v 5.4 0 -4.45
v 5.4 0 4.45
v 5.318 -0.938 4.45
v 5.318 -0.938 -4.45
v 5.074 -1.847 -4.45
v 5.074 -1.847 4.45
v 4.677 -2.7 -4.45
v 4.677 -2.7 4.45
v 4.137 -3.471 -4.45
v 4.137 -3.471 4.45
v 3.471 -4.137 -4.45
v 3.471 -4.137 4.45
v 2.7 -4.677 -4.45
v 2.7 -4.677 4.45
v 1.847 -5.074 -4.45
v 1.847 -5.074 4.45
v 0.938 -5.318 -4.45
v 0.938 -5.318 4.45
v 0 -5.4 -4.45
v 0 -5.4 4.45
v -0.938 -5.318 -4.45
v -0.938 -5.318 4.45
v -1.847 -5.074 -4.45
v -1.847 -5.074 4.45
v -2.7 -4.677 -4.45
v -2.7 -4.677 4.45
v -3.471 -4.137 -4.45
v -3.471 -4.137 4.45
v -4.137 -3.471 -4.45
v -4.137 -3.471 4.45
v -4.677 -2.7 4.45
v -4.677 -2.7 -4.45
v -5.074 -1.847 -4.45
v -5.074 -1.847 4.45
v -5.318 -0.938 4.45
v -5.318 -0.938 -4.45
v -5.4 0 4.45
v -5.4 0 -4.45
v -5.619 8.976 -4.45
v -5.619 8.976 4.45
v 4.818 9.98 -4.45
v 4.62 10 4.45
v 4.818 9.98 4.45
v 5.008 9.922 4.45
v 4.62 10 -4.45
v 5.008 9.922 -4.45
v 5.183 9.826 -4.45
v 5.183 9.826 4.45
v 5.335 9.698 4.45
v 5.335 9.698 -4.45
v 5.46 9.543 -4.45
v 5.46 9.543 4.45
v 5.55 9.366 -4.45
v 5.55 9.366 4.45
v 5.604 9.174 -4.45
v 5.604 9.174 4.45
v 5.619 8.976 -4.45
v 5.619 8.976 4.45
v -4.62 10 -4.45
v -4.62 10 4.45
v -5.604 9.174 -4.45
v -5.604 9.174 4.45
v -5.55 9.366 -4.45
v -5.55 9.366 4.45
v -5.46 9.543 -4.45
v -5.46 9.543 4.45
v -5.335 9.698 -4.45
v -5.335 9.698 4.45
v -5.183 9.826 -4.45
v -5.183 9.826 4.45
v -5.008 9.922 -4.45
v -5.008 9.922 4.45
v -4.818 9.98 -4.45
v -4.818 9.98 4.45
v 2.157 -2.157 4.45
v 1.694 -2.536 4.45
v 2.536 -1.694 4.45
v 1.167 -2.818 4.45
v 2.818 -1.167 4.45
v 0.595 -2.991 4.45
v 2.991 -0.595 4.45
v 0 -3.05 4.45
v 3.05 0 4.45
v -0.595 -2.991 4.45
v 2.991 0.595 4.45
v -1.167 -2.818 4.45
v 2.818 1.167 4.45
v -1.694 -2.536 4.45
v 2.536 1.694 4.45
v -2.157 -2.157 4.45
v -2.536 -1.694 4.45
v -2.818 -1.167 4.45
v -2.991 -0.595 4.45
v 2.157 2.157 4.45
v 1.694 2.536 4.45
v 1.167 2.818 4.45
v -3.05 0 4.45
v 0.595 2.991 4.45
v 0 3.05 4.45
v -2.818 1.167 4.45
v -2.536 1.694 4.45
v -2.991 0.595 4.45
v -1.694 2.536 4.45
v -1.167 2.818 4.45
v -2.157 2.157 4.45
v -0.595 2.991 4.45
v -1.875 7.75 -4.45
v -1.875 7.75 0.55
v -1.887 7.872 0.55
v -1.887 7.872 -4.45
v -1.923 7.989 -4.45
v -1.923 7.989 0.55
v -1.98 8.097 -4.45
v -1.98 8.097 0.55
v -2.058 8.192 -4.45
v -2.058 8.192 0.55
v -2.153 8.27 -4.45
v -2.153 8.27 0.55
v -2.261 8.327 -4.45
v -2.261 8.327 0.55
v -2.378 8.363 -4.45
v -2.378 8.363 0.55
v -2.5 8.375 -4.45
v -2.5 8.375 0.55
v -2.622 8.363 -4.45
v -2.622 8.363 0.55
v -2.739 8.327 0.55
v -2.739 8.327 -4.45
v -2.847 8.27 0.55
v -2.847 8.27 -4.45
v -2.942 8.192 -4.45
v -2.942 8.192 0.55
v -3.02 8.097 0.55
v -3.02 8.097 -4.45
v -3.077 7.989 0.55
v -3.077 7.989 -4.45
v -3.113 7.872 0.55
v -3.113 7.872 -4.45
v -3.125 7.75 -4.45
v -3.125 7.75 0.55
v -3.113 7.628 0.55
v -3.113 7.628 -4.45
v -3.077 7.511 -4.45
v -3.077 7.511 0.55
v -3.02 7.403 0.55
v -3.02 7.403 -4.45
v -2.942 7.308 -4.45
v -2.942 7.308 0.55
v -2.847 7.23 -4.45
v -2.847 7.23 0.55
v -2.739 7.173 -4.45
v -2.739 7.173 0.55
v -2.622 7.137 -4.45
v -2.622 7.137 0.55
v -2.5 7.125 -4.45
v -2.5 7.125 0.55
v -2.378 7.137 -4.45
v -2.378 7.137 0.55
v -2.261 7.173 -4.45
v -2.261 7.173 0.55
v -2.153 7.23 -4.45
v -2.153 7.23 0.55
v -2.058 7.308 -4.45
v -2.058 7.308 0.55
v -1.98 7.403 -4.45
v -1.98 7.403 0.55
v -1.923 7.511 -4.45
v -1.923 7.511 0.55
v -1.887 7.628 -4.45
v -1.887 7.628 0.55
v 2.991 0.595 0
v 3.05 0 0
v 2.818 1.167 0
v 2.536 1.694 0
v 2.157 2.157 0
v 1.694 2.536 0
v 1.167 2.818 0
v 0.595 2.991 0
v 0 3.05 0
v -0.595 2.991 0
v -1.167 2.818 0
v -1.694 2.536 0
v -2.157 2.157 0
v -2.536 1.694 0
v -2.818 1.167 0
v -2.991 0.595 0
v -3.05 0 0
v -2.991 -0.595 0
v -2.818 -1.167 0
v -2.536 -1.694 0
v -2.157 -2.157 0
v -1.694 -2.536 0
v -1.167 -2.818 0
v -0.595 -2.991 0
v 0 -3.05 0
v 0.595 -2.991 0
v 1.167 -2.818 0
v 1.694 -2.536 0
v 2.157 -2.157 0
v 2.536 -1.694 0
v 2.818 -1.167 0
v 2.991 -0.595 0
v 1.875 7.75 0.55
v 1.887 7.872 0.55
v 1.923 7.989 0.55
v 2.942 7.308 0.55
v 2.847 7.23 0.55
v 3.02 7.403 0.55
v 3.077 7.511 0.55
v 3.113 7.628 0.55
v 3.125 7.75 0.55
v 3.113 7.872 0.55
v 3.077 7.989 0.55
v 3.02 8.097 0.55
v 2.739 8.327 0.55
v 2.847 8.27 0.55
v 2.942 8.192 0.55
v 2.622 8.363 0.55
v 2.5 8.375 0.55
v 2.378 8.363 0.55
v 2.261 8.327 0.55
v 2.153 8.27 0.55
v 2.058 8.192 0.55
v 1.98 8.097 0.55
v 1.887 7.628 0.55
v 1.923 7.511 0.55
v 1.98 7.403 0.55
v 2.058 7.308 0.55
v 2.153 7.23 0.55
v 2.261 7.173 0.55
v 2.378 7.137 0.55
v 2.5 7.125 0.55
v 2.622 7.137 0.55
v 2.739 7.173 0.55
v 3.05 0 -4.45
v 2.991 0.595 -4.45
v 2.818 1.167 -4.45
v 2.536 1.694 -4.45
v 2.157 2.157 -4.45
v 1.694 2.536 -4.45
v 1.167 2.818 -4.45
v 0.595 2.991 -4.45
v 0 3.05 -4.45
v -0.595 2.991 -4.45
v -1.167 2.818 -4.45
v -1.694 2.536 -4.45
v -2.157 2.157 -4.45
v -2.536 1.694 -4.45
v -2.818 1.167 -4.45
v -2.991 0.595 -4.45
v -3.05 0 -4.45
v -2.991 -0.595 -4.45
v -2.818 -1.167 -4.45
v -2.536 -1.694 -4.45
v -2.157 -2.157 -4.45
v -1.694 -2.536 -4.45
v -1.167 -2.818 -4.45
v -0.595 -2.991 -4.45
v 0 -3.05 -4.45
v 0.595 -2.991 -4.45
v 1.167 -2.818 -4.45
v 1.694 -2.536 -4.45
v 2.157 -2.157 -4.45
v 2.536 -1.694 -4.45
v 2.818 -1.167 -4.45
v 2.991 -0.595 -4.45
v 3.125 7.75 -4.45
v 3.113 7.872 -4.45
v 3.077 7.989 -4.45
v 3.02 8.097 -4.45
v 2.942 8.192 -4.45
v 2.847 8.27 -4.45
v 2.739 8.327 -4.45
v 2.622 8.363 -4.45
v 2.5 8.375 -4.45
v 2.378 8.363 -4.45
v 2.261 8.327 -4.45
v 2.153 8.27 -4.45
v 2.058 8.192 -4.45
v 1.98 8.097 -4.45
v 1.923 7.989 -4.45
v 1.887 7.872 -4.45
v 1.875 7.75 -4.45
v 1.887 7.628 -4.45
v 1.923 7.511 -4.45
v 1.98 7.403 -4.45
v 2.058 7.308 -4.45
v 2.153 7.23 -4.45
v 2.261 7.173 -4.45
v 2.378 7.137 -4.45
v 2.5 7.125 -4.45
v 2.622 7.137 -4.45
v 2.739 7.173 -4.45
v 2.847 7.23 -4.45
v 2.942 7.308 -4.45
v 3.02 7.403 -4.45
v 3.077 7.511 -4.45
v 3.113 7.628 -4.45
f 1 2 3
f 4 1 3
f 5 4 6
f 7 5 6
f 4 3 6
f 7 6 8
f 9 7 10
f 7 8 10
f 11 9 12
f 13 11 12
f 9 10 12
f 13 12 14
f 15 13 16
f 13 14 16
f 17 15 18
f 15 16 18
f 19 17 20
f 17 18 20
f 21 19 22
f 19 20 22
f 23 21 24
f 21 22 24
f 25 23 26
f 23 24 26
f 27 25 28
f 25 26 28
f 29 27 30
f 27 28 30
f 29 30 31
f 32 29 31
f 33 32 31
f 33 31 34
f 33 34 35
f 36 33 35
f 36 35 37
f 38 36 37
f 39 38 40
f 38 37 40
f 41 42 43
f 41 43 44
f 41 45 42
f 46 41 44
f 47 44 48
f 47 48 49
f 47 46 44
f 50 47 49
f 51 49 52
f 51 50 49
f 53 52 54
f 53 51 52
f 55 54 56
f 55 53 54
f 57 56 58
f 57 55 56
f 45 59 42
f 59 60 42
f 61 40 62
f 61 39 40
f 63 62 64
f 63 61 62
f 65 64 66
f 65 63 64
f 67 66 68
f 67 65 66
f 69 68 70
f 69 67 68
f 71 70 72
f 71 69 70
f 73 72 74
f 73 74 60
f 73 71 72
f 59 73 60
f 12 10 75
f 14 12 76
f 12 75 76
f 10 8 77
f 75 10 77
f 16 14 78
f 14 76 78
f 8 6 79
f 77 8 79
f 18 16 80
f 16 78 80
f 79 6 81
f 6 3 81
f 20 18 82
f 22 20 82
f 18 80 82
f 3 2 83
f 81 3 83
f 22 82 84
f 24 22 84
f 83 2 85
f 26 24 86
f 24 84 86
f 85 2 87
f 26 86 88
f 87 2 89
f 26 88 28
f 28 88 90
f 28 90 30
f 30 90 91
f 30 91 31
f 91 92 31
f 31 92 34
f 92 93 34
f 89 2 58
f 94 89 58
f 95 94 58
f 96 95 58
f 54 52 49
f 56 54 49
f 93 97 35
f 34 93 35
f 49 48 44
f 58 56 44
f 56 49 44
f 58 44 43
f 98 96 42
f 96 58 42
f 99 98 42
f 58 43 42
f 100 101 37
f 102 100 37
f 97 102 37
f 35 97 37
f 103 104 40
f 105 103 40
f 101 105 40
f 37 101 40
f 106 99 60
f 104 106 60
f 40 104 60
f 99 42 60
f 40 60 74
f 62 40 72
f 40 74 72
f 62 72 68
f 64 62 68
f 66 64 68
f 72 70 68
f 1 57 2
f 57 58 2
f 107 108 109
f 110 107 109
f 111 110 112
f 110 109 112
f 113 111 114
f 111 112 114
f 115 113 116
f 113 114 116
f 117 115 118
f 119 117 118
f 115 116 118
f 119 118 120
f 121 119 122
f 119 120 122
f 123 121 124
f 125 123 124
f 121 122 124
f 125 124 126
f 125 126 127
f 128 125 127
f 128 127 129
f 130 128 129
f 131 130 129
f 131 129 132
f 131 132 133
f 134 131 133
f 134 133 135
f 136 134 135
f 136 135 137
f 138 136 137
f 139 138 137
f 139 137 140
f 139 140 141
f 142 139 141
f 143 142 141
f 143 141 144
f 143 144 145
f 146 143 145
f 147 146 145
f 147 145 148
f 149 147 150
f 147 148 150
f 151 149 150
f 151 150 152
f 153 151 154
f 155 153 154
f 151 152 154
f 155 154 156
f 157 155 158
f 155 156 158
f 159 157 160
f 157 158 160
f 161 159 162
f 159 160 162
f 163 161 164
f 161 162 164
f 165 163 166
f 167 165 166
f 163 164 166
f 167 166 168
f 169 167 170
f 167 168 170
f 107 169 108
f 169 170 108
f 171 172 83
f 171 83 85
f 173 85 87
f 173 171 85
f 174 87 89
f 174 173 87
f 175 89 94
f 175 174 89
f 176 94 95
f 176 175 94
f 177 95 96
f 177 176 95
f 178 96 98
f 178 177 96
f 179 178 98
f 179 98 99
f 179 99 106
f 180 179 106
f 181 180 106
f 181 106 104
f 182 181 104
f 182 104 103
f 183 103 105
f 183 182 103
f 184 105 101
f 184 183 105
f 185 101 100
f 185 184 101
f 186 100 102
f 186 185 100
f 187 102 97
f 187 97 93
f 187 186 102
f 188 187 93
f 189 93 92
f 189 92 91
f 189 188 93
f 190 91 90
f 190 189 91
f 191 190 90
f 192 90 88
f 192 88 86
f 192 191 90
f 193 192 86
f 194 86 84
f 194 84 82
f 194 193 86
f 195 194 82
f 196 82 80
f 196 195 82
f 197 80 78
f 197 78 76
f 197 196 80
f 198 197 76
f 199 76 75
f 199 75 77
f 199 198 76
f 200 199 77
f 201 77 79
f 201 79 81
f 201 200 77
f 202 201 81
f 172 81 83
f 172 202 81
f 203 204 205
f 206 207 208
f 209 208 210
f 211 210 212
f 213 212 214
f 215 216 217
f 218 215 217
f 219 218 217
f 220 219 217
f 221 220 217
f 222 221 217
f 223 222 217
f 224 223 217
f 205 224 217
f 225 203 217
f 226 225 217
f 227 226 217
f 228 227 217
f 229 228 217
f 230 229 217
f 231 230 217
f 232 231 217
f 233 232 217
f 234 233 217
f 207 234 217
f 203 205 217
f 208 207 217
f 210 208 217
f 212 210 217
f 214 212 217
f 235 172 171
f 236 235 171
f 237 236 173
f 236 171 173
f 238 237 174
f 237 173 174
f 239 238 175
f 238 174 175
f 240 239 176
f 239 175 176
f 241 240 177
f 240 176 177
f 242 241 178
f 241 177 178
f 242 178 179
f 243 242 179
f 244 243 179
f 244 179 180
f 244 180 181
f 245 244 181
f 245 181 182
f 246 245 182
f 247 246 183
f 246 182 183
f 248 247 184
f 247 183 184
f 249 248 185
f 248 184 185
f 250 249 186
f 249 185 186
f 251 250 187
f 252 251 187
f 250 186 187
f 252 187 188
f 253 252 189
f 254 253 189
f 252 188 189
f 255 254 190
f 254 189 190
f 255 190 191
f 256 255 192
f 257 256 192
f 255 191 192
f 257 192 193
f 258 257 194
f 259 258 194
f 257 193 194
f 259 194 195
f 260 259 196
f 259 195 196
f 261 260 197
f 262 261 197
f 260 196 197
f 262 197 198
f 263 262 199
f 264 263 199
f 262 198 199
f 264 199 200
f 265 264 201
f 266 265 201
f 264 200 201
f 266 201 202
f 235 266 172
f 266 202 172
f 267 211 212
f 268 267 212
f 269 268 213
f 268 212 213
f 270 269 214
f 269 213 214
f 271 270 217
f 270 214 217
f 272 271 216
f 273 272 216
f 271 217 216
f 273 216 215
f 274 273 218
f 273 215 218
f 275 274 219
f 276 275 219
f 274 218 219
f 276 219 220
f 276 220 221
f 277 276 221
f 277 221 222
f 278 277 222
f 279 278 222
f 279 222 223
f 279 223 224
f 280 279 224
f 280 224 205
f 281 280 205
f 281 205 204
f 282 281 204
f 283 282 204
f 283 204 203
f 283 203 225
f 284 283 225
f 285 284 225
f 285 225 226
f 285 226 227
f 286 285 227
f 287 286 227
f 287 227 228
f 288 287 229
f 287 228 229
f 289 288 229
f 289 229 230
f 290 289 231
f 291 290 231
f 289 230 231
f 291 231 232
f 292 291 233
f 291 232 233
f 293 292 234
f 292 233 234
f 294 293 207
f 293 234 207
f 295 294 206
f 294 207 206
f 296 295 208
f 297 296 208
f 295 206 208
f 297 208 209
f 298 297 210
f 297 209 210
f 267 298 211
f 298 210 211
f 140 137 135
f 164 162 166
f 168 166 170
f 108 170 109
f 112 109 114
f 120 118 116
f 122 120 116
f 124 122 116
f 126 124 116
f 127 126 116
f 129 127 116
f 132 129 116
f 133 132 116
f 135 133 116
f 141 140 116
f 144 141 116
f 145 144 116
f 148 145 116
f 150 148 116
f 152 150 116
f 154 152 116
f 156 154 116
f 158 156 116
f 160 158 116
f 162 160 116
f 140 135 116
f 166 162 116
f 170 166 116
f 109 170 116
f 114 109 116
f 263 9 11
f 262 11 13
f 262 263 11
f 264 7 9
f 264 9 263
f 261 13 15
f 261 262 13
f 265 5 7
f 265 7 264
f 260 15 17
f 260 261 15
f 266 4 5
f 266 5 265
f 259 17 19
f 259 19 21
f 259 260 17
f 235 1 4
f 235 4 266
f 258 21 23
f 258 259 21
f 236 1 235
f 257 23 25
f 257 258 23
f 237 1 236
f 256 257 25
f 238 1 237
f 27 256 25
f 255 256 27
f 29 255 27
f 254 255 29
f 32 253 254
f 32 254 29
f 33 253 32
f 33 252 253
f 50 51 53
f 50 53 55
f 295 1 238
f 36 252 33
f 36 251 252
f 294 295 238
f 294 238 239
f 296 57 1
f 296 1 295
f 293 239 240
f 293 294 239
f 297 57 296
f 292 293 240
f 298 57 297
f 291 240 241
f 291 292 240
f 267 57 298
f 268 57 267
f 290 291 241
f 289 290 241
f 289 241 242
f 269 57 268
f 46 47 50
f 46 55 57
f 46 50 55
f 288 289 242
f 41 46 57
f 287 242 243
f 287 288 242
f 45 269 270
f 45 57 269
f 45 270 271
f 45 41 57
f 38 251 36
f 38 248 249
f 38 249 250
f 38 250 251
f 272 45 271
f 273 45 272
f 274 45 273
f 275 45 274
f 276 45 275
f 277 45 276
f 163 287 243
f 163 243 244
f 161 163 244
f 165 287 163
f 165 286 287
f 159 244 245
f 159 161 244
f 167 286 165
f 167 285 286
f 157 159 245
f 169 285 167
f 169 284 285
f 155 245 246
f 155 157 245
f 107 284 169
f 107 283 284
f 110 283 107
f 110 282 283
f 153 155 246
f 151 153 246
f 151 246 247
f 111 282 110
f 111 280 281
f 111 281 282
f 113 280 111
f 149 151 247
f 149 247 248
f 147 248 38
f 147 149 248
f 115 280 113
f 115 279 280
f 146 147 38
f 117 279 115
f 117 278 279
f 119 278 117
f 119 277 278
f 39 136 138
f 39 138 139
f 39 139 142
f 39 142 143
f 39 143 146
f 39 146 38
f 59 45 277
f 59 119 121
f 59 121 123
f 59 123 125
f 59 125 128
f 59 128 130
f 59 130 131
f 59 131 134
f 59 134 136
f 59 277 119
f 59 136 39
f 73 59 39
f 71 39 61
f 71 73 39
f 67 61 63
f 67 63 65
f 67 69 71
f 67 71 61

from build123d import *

# Parameters (mm, degrees)
BOSS_EXTRUDE1_DEPTH           = 4.45
BOSS_EXTRUDE1_DEPTH_BACK      = 4.45
SKETCH1_R                     = 3.05
TAP_DRILL_FOR_M1_6_TAP1_D     = 1.25
TAP_DRILL_FOR_M1_6_TAP1_DEPTH = 5
FILLET1_R                     = 1


with BuildPart() as part:
    # Sketch1 → Boss-Extrude1 (new, two sides: drawn at the far end of the back side and taken through both)
    with BuildSketch(Plane.XY.offset(-BOSS_EXTRUDE1_DEPTH_BACK)):
        with BuildLine():
            Line((-5.4, 0), (-5.644394736, 10))
            Line((-5.644394736, 10), (5.644394736, 10))
            Line((5.644394736, 10), (5.4, 0))
            ThreePointArc((5.4, 0), (0, -5.4), (-5.4, 0))
        make_face()
        Circle(SKETCH1_R, mode=Mode.SUBTRACT)
    extrude(amount=BOSS_EXTRUDE1_DEPTH + BOSS_EXTRUDE1_DEPTH_BACK)

    # Tap Drill for M1.6 Tap1
    with Locations(Plane(origin=(0, 0, -4.45), x_dir=(-1, 0, 0), z_dir=(0, 0, -1))):
        with Locations((-2.5, 7.75), (2.5, 7.75)):
            Hole(TAP_DRILL_FOR_M1_6_TAP1_D / 2, depth=TAP_DRILL_FOR_M1_6_TAP1_DEPTH)

    # Fillet1
    fillet1_edges = [part.edges().sort_by_distance(p)[0] for p in [
        (-5.644394736, 10, 0),
        (5.644394736, 10, 0),
    ]]
    fillet(fillet1_edges, radius=FILLET1_R)


solid = part.part
